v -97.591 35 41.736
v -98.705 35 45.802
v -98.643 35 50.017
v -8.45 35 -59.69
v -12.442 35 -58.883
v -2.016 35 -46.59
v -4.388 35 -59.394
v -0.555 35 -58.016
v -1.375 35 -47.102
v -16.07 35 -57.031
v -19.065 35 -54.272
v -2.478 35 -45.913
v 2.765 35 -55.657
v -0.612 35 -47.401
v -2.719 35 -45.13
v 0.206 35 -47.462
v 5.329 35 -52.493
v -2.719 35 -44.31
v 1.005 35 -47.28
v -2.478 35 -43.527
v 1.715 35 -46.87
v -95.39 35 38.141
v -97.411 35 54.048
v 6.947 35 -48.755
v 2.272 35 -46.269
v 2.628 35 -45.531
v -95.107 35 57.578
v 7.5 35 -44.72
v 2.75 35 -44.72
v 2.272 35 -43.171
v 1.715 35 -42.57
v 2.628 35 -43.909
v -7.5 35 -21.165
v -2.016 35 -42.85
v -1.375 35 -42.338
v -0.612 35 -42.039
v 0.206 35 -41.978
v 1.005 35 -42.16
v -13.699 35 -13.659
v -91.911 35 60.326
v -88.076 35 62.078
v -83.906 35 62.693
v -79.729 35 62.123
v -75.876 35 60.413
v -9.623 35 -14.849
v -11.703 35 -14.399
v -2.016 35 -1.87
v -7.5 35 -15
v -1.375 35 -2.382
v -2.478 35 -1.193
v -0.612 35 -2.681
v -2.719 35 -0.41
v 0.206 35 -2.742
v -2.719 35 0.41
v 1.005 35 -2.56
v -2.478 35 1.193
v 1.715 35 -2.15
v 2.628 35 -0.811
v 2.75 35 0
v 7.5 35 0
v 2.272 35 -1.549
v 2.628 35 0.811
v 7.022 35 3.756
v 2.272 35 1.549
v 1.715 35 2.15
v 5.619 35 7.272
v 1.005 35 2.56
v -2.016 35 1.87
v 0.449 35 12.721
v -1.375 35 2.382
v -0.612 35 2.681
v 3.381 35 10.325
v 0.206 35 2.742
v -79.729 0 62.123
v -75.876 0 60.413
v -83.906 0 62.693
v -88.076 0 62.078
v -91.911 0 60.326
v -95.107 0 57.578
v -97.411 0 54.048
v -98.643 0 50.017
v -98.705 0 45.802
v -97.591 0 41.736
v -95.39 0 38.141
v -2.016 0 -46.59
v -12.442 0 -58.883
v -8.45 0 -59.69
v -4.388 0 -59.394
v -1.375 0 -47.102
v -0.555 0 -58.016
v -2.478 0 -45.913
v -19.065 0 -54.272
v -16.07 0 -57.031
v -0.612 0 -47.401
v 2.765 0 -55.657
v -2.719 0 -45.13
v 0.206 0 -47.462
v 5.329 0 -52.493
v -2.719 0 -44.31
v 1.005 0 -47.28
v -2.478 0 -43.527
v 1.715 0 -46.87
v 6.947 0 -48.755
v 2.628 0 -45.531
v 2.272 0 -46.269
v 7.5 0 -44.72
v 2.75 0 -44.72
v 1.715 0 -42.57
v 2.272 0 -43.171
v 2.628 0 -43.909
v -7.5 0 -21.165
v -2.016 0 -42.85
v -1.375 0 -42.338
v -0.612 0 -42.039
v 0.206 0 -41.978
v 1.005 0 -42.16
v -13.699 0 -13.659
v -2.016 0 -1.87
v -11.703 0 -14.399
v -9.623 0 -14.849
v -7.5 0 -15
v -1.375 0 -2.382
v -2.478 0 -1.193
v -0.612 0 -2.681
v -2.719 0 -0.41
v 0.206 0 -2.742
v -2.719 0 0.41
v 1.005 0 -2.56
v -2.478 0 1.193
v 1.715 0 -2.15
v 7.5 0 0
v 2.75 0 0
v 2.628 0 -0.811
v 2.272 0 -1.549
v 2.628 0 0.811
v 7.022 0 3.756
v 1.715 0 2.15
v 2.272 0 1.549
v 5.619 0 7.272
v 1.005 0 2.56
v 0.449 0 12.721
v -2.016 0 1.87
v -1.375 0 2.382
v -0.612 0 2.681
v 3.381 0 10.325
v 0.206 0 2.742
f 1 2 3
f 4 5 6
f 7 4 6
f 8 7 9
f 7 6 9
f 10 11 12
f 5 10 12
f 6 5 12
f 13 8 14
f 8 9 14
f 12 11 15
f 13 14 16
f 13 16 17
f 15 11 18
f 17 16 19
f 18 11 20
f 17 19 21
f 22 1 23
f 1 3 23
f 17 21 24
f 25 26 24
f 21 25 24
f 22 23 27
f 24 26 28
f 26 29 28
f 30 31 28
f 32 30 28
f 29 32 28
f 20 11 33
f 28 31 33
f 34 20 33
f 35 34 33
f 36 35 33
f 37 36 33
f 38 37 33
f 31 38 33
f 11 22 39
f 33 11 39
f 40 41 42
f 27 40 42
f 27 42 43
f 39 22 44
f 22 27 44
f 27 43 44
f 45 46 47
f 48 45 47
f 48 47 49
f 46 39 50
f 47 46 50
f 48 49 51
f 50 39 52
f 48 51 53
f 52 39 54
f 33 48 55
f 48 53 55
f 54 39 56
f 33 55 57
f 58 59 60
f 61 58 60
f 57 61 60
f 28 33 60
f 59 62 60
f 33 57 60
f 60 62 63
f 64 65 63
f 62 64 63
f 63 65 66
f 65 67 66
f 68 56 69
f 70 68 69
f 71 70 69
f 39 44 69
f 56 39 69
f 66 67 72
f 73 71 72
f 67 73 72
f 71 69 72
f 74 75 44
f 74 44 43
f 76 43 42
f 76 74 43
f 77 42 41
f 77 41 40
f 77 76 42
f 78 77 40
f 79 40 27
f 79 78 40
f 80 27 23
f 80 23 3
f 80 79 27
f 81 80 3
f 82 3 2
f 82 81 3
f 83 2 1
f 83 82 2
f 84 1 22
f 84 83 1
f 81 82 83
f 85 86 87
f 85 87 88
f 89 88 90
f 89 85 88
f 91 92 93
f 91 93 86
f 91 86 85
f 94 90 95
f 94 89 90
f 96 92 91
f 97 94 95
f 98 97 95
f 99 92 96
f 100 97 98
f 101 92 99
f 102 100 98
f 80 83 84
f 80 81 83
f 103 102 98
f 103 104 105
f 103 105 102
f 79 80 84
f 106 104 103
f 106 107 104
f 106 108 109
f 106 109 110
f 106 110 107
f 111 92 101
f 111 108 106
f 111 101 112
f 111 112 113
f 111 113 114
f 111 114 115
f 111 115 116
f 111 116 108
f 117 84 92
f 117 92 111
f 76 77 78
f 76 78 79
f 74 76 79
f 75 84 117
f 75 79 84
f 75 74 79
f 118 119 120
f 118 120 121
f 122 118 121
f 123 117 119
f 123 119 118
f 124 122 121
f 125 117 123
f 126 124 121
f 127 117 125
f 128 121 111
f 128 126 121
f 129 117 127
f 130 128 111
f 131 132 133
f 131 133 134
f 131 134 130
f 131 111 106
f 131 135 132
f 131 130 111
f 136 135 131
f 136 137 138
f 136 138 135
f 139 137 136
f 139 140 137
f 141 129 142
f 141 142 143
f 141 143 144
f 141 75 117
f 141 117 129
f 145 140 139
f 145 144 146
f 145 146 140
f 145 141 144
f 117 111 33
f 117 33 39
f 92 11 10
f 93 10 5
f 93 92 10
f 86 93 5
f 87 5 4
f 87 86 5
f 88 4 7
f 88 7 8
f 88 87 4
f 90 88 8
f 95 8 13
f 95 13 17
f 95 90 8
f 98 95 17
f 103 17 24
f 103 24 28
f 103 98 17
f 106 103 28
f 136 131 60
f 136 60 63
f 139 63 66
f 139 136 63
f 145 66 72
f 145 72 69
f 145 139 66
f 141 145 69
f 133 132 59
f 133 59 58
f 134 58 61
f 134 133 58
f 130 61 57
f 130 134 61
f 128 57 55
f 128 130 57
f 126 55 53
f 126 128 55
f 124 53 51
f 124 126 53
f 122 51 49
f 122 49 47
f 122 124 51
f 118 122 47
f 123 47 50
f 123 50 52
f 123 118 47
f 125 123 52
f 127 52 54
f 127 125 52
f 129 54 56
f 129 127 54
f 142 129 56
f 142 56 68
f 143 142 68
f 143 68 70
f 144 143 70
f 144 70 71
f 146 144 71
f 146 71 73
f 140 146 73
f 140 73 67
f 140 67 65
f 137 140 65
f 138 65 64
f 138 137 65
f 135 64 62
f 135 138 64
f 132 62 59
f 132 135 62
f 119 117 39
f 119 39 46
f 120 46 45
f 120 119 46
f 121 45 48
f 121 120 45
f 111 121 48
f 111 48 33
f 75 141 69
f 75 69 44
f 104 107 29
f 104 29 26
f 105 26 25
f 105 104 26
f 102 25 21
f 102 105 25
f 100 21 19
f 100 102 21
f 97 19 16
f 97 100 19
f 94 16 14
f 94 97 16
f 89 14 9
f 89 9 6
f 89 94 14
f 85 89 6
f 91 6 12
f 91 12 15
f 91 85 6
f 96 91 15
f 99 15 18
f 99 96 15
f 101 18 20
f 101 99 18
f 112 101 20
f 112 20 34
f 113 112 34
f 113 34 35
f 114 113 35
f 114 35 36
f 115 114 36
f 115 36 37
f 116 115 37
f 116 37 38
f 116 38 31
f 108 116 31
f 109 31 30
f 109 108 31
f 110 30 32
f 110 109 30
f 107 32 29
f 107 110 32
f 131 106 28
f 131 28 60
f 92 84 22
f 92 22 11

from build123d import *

# Parameters (mm, degrees)
SKETCH1_R           = 2.75
BOSS_EXTRUDE1_DEPTH = 35
SKETCH2_R           = 2.75
BOSS_EXTRUDE2_DEPTH = 35


with BuildPart() as part:
    # Sketch1 → Boss-Extrude1 (new body)
    with BuildSketch(Plane(origin=(0, 0, 0), x_dir=(1, 0, 0), z_dir=(0, 1, 0))):
        with BuildLine():
            Line((7.5, 44.72), (7.5, 0))
            ThreePointArc((7.5, 0), (0, -7.5), (-7.5, 0))
            Line((-7.5, 0), (-7.5, 44.72))
            ThreePointArc((-7.5, 44.72), (0, 52.22), (7.5, 44.72))
        make_face()
        with Locations((0, 44.72)):
            Circle(SKETCH1_R, mode=Mode.SUBTRACT)
        Circle(SKETCH1_R, mode=Mode.SUBTRACT)
    extrude(amount=BOSS_EXTRUDE1_DEPTH)

    # Sketch2 → Boss-Extrude2 (add)
    with BuildSketch(Plane.XZ):
        with BuildLine():
            ThreePointArc((-75.875539691, 60.413455223), (-95.106545537, 57.577650686), (-95.38977649, 38.140748838))
            Line((-95.38977649, 38.140748838), (-19.065447836, -54.271984943))
            ThreePointArc((-19.065447836, -54.271984943), (2.051984943, -56.285447836), (4.065447836, -35.168015057))
            Line((4.065447836, -35.168015057), (-13.698799918, -13.659241545))
            ThreePointArc((-13.698799918, -13.659241545), (5.718972245, -7.089342197), (0.448788963, 12.720721442))
            Line((0.448788963, 12.720721442), (-75.875539691, 60.413455223))
        make_face()
        Circle(SKETCH2_R, mode=Mode.SUBTRACT)
        with Locations((0, -44.72)):
            Circle(SKETCH2_R, mode=Mode.SUBTRACT)
    extrude(amount=-BOSS_EXTRUDE2_DEPTH)


solid = part.part
